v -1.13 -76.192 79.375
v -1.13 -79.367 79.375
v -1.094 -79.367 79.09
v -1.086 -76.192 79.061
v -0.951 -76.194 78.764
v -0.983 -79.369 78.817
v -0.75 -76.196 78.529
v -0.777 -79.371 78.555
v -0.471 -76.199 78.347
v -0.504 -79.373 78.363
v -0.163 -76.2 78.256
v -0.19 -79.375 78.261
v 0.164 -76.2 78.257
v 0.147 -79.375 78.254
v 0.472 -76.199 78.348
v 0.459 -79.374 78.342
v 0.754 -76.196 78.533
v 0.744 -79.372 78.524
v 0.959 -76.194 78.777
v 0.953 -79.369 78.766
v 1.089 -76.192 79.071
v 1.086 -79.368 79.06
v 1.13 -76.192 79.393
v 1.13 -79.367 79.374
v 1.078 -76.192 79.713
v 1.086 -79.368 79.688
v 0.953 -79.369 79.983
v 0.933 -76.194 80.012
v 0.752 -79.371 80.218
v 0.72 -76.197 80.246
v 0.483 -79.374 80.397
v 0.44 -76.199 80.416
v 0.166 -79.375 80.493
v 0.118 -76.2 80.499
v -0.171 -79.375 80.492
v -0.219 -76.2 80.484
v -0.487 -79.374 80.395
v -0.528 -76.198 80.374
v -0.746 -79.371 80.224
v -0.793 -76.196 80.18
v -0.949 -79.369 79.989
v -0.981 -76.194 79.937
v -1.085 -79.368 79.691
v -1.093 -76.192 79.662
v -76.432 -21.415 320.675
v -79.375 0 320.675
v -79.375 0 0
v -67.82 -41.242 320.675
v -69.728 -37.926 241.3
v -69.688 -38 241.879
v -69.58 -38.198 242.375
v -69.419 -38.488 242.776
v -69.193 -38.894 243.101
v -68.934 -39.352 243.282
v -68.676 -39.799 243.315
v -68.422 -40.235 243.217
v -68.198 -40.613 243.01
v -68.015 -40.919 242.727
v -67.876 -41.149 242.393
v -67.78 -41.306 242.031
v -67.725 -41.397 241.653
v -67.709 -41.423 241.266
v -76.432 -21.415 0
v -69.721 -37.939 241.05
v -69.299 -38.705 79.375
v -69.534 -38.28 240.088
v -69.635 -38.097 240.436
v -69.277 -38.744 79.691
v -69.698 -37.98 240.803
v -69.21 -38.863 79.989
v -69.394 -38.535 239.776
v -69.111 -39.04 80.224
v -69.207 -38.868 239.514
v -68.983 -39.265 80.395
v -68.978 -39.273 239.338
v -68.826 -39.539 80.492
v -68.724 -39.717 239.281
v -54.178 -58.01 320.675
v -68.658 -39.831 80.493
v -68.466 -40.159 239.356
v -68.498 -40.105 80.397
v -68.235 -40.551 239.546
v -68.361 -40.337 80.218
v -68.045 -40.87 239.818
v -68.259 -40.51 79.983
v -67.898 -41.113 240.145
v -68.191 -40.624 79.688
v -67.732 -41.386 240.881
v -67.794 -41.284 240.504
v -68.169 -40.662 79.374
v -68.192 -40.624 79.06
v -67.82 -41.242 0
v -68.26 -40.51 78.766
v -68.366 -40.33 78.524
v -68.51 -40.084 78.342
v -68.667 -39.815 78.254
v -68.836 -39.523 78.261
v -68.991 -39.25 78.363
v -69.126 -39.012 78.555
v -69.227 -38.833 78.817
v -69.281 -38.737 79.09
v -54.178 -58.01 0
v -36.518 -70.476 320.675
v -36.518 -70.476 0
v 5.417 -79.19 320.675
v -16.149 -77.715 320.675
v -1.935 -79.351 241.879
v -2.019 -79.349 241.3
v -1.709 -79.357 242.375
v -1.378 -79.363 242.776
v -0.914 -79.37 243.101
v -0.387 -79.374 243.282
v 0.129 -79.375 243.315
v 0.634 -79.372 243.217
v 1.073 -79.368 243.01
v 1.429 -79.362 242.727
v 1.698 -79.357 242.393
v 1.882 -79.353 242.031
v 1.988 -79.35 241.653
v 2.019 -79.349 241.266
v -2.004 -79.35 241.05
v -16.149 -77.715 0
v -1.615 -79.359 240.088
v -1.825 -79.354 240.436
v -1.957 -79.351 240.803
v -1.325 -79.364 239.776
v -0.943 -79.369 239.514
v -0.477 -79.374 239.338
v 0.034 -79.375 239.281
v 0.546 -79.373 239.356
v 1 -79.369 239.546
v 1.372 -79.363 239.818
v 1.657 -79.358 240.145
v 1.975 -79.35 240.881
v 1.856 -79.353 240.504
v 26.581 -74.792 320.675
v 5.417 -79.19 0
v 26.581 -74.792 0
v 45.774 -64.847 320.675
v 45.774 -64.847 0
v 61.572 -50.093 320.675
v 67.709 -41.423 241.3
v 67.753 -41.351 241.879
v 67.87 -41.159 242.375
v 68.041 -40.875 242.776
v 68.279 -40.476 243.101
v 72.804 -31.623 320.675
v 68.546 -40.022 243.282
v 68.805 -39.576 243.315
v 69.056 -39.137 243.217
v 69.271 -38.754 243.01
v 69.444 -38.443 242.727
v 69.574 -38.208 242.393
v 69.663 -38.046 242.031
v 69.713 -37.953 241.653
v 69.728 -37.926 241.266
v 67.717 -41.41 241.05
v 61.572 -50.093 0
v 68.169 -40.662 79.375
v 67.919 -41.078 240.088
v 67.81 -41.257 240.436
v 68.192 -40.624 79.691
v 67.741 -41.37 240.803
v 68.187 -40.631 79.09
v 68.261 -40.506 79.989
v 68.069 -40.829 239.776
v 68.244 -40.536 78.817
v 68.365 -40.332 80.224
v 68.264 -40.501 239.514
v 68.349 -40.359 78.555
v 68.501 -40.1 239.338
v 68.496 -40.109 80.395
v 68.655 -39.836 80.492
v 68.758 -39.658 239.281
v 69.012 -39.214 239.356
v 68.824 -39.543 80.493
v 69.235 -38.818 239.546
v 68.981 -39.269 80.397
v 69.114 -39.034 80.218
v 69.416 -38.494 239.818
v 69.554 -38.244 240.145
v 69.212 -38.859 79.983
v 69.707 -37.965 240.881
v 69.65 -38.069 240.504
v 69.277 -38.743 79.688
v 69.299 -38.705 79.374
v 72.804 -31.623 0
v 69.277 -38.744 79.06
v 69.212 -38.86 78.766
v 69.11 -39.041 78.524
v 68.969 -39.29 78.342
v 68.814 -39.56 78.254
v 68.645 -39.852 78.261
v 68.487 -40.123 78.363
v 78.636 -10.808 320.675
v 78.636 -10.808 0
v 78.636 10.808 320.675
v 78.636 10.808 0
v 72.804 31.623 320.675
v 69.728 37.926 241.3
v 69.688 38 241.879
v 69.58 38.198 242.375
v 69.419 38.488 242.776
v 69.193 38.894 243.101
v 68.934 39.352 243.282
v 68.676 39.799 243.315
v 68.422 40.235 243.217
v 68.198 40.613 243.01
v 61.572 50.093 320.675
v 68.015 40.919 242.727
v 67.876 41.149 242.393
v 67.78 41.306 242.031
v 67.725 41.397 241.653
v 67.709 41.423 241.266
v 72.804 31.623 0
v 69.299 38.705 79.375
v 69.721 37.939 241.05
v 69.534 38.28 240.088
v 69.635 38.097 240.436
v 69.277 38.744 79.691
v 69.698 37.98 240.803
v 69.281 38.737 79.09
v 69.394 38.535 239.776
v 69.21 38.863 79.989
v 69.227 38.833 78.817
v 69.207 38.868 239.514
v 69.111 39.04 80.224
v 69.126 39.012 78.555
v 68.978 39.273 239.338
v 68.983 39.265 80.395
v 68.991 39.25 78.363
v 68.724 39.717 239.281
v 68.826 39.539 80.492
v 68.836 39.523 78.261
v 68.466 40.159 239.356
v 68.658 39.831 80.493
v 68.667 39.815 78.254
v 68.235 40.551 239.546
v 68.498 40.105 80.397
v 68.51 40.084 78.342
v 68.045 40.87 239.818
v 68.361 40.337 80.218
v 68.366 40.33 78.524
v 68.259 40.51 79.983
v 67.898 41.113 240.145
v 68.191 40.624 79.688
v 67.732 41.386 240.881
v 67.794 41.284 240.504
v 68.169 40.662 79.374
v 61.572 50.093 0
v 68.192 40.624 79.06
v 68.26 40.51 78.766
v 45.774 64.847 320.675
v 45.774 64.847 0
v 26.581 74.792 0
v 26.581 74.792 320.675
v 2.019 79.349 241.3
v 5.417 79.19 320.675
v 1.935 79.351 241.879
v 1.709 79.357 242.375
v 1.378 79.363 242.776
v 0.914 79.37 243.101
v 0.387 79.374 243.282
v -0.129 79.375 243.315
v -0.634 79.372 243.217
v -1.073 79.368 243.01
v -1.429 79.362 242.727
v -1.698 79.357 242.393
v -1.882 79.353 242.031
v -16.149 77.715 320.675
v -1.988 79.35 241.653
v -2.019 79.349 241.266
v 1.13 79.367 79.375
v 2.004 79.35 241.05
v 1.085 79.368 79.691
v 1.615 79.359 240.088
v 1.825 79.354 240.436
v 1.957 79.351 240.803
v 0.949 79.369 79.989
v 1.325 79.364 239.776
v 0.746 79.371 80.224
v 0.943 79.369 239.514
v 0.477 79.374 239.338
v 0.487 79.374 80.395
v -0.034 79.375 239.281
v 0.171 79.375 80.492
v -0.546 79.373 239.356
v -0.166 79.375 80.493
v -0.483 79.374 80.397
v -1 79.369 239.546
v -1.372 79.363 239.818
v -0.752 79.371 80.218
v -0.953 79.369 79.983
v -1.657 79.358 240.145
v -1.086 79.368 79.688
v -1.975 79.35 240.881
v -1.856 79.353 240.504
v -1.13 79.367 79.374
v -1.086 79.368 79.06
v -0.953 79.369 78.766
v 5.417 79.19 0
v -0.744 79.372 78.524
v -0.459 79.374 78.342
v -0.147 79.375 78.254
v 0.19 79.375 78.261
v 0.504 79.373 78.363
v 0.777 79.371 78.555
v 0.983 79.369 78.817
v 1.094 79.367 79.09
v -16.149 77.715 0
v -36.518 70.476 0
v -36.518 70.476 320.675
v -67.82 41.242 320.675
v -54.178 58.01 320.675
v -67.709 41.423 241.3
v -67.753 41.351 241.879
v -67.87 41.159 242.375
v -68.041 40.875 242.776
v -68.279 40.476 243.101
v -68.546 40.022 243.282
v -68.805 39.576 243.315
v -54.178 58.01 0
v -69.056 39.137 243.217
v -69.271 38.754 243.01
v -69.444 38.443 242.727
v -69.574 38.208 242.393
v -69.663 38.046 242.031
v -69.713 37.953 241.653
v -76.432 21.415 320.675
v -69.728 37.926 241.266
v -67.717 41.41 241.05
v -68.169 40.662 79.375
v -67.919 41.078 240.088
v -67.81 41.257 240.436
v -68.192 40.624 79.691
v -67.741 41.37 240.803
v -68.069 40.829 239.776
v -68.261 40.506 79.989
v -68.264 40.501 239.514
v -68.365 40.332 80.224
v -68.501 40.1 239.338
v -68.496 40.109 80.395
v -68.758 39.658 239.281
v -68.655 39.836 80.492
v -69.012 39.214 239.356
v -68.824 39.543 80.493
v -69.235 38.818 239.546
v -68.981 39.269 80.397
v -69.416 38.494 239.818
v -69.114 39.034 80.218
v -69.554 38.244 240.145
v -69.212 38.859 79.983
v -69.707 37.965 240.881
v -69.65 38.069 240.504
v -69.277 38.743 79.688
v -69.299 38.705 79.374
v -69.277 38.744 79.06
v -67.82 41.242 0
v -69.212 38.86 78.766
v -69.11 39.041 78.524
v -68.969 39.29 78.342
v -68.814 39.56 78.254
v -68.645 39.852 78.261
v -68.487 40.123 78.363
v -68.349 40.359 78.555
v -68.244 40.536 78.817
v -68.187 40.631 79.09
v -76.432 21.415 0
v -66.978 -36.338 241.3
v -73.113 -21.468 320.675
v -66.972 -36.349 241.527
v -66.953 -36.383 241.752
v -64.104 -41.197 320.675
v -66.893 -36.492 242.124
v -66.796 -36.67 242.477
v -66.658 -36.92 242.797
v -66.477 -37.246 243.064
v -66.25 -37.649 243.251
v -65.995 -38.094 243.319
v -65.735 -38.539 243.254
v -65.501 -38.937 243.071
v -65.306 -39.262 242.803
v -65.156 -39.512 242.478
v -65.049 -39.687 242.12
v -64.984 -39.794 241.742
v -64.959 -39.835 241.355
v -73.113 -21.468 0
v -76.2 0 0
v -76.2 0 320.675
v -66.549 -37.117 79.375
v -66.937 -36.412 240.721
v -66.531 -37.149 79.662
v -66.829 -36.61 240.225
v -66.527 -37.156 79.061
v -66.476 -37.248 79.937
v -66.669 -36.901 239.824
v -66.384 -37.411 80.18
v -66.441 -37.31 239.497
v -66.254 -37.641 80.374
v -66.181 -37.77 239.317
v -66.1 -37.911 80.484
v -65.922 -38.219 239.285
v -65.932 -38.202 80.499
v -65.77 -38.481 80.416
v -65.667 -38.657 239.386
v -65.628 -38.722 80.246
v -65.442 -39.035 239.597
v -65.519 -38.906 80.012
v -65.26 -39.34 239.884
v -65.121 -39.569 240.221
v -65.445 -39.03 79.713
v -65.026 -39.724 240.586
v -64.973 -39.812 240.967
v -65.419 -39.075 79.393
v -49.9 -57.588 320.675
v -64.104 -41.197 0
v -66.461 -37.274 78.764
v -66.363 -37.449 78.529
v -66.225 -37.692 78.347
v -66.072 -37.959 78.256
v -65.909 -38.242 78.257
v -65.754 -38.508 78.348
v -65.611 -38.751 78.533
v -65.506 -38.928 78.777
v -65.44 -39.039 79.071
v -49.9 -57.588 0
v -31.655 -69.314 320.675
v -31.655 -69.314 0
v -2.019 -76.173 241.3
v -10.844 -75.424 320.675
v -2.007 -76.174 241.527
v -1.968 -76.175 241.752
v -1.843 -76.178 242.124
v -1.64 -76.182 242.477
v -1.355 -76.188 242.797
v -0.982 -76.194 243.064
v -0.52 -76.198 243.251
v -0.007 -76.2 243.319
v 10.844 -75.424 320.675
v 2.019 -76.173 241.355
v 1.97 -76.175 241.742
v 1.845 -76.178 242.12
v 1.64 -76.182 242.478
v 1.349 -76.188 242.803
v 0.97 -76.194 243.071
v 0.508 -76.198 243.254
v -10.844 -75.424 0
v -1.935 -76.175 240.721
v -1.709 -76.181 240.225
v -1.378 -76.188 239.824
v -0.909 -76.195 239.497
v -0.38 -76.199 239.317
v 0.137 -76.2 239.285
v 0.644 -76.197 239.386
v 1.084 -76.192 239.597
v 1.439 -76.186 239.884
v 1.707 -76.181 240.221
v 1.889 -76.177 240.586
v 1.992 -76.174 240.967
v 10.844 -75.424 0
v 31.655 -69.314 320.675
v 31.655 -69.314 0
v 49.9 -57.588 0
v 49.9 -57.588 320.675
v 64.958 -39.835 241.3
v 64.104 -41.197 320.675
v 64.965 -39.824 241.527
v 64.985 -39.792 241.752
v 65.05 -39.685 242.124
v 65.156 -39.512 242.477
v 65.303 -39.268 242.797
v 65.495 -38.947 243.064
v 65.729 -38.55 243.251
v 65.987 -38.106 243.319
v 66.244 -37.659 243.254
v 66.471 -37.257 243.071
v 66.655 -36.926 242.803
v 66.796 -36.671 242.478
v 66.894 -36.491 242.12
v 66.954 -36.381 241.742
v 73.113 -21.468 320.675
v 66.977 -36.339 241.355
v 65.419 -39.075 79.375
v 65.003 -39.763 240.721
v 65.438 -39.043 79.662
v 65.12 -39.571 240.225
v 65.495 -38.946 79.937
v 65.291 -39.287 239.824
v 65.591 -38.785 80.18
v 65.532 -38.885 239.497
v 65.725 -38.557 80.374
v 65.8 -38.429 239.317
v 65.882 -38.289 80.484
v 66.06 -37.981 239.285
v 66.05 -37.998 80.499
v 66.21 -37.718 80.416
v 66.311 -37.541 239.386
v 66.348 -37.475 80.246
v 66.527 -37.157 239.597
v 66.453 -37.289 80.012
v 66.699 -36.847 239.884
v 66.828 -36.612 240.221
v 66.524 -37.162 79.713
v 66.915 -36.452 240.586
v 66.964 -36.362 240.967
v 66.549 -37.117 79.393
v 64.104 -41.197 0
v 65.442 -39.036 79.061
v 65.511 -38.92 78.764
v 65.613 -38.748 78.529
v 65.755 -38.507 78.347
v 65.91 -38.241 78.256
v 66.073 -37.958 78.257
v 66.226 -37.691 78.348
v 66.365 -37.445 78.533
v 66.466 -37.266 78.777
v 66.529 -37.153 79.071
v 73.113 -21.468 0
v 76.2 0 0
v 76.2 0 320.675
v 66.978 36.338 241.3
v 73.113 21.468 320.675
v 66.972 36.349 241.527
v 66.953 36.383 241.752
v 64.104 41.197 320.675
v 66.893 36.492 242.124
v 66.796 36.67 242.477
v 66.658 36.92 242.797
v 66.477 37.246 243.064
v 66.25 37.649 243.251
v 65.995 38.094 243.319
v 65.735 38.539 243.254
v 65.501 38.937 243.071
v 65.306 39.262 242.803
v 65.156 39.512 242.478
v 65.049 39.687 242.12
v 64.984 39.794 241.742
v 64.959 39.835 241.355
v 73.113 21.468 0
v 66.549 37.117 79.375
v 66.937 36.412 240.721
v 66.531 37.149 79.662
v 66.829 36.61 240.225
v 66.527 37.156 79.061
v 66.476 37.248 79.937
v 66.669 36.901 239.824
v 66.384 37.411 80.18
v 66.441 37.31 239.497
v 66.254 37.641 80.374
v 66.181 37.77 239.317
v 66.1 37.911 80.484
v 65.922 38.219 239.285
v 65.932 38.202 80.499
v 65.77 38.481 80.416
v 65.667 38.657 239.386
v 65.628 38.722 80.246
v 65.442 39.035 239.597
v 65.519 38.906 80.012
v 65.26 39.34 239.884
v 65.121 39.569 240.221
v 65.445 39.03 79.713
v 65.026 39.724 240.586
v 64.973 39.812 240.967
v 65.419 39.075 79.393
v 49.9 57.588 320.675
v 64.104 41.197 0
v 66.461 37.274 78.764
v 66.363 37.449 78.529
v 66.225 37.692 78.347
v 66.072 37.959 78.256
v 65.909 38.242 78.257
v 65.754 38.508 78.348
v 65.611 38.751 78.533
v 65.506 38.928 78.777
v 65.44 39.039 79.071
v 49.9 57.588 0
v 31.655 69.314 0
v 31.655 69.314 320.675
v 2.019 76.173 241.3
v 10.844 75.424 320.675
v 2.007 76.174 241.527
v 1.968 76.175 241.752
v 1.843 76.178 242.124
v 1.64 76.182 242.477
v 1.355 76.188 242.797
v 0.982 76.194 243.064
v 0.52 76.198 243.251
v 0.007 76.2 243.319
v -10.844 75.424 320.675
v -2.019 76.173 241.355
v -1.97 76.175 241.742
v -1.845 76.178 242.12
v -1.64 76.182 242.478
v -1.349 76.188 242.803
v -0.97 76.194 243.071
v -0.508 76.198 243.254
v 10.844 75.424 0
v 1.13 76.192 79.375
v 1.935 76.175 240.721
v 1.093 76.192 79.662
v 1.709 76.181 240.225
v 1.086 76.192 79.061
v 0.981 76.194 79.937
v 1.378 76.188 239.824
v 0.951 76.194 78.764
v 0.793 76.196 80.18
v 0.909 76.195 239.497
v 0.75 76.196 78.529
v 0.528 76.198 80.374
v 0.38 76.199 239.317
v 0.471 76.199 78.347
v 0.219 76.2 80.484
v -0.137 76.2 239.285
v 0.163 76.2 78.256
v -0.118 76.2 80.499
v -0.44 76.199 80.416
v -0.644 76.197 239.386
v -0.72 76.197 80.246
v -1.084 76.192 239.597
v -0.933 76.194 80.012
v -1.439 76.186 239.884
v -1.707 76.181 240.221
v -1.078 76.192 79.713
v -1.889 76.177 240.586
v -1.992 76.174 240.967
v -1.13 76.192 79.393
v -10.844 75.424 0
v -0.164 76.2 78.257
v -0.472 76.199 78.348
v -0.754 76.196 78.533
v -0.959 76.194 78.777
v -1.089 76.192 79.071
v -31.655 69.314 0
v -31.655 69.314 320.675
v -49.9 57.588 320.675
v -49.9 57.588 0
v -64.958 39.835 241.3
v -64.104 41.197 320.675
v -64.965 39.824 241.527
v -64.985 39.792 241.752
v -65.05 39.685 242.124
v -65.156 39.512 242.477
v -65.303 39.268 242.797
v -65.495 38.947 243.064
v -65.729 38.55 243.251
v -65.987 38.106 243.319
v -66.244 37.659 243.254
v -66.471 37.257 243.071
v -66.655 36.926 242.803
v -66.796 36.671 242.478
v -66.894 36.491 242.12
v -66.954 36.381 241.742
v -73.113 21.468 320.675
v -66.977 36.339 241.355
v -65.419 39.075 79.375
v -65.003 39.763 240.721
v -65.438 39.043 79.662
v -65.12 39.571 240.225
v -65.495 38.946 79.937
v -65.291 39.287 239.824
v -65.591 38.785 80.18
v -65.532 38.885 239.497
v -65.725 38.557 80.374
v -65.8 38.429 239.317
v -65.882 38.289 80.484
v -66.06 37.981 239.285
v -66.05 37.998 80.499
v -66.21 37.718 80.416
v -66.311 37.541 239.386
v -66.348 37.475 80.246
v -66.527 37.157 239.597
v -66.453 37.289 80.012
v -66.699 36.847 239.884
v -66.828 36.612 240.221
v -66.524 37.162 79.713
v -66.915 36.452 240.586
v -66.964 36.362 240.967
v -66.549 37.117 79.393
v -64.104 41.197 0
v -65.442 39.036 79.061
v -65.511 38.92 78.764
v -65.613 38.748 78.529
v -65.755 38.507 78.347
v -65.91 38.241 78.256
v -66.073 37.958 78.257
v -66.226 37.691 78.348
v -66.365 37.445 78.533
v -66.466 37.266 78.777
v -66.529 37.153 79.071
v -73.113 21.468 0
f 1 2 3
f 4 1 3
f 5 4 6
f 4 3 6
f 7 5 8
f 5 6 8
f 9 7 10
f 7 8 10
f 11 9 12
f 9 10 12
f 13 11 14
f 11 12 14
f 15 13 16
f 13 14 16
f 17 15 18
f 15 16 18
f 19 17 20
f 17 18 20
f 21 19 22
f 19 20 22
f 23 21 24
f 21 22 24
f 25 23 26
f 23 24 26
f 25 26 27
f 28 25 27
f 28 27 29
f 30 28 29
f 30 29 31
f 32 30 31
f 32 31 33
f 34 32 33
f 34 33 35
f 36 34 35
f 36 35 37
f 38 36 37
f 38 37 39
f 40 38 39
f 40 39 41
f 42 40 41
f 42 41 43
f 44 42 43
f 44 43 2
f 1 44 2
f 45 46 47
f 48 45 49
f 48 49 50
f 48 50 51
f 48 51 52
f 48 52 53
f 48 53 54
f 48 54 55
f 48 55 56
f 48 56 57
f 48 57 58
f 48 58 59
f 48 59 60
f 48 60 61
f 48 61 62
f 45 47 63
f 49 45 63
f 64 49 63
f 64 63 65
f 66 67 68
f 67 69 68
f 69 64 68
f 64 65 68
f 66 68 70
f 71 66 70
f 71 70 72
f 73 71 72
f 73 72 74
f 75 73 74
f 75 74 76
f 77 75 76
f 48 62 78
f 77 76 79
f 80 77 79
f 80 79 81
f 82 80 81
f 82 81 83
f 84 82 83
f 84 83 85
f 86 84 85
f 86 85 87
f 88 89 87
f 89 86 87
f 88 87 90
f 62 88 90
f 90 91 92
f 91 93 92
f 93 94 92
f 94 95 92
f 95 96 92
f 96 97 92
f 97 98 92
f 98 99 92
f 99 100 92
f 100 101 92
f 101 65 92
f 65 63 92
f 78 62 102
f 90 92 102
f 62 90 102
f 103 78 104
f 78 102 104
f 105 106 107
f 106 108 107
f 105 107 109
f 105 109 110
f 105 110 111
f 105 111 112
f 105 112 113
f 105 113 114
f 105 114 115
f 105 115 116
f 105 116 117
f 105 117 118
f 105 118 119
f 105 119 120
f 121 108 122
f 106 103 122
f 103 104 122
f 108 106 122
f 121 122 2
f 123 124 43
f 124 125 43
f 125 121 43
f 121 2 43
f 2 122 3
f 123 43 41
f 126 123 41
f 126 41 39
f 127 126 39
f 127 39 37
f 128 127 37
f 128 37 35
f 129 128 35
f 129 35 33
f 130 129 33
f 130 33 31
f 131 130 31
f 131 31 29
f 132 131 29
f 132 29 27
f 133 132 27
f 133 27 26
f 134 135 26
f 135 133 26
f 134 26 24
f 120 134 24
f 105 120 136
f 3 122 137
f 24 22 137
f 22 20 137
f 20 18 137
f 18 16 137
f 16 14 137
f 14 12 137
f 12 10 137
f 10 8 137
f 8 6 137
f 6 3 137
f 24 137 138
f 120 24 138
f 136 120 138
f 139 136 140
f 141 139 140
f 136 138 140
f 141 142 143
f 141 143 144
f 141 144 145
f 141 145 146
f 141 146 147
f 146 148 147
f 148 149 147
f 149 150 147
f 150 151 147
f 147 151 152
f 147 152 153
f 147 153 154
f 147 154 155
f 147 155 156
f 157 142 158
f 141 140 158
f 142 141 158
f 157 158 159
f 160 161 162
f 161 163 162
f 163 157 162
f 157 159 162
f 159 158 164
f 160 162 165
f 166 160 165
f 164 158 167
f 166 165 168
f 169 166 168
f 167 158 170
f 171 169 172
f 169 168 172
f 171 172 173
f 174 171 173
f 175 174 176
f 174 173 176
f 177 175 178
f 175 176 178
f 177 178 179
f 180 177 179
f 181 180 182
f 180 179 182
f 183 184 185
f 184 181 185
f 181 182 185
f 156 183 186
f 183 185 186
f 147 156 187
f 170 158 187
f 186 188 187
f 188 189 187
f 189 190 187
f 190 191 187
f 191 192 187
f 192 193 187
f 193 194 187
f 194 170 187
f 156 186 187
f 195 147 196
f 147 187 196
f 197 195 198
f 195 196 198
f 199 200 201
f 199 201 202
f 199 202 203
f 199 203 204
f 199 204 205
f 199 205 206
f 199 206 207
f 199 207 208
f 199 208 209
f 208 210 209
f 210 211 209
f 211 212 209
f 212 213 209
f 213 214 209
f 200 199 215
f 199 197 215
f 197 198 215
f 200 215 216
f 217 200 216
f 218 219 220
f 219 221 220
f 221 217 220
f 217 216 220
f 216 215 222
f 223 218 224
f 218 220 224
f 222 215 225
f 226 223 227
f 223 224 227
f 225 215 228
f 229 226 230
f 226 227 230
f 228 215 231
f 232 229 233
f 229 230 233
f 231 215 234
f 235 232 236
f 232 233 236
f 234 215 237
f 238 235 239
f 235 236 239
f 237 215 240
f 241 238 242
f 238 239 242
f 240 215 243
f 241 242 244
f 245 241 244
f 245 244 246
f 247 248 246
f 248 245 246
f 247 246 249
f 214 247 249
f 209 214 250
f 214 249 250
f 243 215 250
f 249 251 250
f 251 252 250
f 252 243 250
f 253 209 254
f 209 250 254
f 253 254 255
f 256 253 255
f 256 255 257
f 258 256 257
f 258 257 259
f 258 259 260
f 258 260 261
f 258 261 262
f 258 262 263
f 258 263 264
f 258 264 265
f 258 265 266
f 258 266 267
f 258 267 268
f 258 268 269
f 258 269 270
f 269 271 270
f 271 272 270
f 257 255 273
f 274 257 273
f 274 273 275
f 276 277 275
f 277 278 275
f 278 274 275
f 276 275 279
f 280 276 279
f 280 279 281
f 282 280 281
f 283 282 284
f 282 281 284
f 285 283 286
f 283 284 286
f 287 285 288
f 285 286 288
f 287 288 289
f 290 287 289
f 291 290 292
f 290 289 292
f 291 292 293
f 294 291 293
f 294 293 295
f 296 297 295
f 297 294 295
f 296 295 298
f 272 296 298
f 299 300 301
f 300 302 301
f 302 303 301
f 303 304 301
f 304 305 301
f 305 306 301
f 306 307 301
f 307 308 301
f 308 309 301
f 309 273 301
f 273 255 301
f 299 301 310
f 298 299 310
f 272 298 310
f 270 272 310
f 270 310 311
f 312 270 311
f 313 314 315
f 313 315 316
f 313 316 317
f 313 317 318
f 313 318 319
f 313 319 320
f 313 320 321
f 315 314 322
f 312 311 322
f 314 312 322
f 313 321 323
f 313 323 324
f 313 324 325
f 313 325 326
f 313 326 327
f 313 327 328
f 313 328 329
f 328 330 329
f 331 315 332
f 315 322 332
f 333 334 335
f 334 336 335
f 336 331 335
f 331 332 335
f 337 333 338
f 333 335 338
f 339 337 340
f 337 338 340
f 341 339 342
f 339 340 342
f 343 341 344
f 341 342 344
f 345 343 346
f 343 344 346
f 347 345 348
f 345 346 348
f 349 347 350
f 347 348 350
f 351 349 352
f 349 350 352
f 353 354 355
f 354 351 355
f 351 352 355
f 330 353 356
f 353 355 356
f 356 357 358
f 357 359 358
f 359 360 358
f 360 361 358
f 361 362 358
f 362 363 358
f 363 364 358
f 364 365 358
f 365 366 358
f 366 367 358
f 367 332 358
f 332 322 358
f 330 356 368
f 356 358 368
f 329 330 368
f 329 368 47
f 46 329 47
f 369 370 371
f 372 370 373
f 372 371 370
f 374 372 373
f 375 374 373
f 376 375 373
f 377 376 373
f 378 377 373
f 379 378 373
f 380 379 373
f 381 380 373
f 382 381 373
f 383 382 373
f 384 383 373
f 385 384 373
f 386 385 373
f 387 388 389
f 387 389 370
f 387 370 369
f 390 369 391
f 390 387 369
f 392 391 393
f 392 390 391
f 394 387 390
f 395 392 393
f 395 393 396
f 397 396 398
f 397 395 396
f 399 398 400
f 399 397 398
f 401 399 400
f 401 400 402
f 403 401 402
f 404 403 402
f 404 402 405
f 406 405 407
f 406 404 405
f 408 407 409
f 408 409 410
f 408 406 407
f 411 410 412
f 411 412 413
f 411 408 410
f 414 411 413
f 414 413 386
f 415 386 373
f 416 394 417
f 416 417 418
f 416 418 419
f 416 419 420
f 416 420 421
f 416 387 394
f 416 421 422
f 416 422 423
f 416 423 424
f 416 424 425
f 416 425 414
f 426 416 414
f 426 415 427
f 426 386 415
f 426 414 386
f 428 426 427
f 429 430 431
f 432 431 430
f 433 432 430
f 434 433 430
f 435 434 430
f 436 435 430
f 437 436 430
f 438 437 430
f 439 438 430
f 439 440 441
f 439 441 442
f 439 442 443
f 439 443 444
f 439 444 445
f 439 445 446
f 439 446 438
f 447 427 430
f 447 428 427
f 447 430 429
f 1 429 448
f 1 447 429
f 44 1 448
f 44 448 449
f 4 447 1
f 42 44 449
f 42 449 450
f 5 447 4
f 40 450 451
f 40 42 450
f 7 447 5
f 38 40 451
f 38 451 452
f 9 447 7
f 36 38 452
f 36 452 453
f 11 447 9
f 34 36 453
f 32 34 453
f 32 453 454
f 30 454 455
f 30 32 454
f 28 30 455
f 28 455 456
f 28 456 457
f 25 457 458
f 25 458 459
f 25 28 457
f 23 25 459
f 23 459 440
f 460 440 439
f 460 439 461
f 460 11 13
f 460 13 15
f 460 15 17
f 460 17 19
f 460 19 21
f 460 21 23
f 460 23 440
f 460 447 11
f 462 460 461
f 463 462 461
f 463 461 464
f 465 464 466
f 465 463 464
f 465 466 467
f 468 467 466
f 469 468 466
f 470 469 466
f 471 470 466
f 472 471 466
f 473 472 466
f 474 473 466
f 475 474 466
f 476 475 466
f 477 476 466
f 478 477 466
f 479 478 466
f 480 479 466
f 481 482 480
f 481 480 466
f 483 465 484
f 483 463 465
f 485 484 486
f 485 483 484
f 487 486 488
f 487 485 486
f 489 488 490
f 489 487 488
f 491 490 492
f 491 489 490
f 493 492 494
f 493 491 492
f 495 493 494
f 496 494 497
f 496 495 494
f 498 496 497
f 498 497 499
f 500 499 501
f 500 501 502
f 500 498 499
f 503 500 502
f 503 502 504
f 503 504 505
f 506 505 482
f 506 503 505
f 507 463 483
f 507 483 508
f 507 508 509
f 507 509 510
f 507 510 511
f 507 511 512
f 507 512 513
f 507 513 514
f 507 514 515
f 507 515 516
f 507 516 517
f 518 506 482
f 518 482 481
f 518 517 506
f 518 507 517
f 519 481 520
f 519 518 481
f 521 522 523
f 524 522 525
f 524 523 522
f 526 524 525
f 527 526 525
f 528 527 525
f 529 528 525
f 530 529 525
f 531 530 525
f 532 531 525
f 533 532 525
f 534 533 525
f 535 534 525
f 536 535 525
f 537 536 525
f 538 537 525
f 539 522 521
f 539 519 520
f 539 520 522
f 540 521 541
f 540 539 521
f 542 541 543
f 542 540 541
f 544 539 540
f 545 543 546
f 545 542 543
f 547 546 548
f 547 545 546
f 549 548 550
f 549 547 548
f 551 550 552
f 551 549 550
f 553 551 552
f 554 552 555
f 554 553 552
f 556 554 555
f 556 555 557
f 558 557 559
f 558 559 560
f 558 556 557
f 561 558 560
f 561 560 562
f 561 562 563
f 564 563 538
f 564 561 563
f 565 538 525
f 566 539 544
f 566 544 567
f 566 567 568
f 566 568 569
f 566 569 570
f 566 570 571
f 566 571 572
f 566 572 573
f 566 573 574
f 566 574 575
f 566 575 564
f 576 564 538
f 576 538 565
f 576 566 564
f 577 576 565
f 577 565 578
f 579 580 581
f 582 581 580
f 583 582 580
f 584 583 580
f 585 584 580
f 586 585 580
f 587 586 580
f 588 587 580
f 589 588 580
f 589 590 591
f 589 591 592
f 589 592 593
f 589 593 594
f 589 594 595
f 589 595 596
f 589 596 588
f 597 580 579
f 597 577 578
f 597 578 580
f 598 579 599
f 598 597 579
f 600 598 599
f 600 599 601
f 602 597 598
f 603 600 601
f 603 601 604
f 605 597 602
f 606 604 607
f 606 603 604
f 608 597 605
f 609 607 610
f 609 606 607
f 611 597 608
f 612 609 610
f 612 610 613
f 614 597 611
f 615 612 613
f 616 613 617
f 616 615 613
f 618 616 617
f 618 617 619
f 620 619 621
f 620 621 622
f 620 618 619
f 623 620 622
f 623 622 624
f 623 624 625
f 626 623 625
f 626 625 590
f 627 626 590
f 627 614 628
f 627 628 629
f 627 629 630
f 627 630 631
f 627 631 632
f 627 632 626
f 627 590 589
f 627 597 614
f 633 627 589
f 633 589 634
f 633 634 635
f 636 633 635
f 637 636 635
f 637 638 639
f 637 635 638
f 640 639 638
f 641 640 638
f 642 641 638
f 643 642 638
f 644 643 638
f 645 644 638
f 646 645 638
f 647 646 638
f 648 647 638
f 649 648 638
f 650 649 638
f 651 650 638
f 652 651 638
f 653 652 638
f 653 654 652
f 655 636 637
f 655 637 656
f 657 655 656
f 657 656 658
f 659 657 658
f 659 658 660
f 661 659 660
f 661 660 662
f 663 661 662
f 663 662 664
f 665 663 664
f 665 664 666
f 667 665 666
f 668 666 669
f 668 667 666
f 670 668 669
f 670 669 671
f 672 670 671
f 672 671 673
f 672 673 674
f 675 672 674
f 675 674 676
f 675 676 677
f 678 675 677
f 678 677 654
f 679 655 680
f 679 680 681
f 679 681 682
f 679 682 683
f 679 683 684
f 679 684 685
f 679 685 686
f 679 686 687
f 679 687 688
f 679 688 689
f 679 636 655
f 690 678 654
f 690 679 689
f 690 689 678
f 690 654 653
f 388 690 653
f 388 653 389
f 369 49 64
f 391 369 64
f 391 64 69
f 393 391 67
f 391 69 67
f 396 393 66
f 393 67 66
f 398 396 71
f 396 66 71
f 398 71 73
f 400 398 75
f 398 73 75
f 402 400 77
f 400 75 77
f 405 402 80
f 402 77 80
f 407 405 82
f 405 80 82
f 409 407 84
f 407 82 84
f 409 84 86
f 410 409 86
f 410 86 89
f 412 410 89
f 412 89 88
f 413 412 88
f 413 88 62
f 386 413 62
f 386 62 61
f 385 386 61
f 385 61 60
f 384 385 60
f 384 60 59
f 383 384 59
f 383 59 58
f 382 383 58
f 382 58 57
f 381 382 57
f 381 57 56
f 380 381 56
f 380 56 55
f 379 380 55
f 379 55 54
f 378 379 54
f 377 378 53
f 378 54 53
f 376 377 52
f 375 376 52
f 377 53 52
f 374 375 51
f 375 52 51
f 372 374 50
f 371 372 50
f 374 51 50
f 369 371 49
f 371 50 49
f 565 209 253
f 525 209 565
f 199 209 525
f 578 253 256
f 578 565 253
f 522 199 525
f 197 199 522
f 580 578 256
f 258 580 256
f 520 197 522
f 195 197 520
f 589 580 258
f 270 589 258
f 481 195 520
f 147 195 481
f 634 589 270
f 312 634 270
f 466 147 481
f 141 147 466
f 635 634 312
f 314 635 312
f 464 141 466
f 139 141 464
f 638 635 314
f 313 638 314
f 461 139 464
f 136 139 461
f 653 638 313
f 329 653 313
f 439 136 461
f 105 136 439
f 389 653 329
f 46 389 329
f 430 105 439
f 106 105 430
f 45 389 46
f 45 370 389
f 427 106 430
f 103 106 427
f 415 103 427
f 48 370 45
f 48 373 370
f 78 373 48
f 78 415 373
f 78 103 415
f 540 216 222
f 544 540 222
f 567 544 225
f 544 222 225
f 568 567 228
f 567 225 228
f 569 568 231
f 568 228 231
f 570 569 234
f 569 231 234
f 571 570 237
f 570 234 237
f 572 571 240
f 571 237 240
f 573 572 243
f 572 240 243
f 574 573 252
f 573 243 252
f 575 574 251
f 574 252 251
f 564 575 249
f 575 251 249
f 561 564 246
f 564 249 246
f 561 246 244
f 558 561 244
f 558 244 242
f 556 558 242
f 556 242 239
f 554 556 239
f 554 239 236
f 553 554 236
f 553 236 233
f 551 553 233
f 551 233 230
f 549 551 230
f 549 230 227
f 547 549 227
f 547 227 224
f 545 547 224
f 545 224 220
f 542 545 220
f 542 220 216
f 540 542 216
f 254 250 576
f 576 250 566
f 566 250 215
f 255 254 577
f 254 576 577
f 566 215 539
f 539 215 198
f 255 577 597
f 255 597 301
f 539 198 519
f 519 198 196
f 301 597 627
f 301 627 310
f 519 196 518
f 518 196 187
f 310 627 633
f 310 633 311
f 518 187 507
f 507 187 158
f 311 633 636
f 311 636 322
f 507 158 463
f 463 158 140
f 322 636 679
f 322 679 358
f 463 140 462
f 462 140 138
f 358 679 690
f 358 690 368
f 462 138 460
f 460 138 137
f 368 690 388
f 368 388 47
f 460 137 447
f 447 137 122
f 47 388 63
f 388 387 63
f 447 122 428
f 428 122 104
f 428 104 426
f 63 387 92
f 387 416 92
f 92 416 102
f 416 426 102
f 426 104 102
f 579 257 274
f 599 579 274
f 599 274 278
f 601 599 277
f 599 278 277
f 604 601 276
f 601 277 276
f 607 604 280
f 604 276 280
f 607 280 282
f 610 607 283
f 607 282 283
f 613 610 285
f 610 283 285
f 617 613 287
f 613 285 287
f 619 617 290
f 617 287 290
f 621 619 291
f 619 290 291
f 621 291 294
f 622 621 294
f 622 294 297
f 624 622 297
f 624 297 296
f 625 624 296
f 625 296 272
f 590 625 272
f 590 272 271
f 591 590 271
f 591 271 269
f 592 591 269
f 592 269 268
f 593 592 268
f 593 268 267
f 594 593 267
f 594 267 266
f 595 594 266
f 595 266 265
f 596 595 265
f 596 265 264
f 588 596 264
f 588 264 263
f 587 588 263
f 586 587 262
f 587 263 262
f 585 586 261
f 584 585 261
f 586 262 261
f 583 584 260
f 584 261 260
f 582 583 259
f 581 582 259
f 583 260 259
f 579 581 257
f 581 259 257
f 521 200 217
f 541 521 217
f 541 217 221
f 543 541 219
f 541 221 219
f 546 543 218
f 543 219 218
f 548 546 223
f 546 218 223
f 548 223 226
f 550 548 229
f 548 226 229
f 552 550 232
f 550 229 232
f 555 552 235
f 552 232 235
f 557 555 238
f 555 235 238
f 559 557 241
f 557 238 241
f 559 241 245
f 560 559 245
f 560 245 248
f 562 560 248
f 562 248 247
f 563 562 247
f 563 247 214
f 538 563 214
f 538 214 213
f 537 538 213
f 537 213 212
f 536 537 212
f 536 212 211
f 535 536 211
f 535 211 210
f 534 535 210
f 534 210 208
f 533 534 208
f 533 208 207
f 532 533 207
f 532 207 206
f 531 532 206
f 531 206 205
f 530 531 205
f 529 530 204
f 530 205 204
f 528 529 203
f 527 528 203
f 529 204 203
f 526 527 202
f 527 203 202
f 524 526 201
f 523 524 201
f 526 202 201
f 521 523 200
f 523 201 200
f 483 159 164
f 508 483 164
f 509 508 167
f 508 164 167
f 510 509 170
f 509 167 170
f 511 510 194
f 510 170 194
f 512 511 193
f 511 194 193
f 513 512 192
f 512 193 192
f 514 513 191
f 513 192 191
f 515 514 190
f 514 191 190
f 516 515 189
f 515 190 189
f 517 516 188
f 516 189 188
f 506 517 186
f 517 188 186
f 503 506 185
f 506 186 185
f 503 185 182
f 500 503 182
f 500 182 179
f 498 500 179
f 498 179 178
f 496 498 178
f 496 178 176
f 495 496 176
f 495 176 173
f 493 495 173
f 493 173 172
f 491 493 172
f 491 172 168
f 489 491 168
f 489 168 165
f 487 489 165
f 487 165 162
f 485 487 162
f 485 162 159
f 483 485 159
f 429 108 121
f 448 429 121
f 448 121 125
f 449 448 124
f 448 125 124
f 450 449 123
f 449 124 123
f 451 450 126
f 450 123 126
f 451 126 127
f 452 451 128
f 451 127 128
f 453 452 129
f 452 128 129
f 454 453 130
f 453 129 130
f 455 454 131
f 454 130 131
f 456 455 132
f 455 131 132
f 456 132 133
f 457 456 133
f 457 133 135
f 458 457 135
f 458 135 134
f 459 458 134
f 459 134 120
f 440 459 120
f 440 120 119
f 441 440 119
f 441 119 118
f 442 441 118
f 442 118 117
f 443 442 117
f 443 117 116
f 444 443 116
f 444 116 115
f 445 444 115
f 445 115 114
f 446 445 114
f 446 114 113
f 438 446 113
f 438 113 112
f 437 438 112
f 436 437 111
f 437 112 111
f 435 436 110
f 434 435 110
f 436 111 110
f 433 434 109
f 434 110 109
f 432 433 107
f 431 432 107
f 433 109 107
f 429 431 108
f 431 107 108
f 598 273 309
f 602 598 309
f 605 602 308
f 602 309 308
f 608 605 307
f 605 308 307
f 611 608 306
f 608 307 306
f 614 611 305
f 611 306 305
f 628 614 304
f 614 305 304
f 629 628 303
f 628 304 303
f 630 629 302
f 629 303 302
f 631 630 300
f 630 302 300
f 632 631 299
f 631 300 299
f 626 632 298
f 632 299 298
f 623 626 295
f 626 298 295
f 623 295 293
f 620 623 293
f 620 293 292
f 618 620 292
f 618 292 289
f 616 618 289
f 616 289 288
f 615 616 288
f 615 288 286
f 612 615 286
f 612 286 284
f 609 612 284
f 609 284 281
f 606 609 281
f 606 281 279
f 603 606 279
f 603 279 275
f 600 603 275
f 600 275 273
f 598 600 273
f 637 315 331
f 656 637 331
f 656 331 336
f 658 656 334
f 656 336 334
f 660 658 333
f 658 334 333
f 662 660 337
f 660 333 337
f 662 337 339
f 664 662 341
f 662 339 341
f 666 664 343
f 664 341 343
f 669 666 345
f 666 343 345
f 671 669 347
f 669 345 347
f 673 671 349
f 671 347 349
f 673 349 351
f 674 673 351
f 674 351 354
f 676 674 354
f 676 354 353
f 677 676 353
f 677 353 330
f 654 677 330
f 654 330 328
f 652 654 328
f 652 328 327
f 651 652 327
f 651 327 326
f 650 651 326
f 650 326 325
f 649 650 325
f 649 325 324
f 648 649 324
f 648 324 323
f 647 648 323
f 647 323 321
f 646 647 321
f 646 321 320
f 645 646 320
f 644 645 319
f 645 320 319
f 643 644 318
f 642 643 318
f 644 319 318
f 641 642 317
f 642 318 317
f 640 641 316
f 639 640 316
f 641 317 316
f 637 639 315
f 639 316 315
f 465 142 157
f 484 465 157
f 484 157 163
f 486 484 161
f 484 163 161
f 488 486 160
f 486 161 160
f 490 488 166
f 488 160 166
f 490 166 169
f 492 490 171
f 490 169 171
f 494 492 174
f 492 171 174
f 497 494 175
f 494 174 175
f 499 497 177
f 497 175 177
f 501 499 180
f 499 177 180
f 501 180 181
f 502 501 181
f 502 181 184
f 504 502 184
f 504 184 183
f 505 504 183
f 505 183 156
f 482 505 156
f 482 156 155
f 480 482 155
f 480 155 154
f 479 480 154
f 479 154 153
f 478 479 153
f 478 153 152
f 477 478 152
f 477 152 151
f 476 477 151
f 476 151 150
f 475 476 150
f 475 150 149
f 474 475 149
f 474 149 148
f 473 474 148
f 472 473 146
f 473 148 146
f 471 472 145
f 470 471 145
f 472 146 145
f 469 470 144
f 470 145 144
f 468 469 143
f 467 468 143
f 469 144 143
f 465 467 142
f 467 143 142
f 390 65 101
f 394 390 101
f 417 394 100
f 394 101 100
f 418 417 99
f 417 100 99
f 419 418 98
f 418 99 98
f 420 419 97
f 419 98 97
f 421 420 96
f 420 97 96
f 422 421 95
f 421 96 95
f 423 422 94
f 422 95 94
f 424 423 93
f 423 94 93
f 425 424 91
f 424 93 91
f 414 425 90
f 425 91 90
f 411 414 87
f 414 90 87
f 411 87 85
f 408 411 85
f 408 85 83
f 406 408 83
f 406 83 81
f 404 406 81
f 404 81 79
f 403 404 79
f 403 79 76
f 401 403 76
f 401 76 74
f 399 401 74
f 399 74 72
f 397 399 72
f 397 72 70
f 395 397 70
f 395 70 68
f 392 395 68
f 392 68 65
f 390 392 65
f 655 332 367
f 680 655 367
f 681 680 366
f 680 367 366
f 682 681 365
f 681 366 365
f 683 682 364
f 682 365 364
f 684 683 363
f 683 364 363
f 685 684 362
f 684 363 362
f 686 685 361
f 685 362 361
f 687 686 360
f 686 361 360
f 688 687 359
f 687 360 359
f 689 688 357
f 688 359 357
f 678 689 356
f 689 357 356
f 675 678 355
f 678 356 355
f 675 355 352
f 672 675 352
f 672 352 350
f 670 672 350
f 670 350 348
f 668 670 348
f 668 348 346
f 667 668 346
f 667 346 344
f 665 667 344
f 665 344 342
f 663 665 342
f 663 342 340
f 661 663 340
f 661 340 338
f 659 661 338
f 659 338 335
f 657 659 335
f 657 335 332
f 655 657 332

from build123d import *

# Parameters (mm, degrees)
SKETCH1_R                   = 79.375
SKETCH1_R_2                 = 76.2
BOSS_EXTRUDE1_DEPTH         = 320.675
F_4_40_TAPPED_HOLE1_REACH   = 368.517
F_4_40_TAPPED_HOLE1_BORE_R  = 1.1303
F_10_32_TAPPED_HOLE1_REACH  = 368.517
F_10_32_TAPPED_HOLE1_BORE_R = 2.0193
CIRPATTERN1_COUNT           = 6


with BuildPart() as part:
    # Sketch1 → Boss-Extrude1 (new body)
    with BuildSketch(Plane.XY):
        with Locations(Location((0, 0, 0), (0, 0, 180))):
            Circle(SKETCH1_R)
        with Locations(Location((0, 0, 0), (0, 0, 180))):
            Circle(SKETCH1_R_2, mode=Mode.SUBTRACT)
    extrude(amount=BOSS_EXTRUDE1_DEPTH)

    # #4-40 Tapped Hole1 bore → #4-40 Tapped Hole1 (cut, up to next)
    with BuildSketch(Plane(origin=(0, 79.375, 0), x_dir=(1, 0, 0), z_dir=(0, 1, 0)), mode=Mode.PRIVATE) as f_4_40_tapped_hole1_sk1:
        with Locations((0, -79.375)):
            Circle(F_4_40_TAPPED_HOLE1_BORE_R)
    f_4_40_tapped_hole1_tool1 = extrude(f_4_40_tapped_hole1_sk1.sketch, amount=-F_4_40_TAPPED_HOLE1_REACH, mode=Mode.PRIVATE) & part.part
    f_4_40_tapped_hole1 = f_4_40_tapped_hole1_tool1.solids().sort_by_distance((0, 79.375, 79.375))[0]
    add(f_4_40_tapped_hole1, mode=Mode.SUBTRACT)

    # #10-32 Tapped Hole1 bore → #10-32 Tapped Hole1 (cut, up to next)
    with BuildSketch(Plane(origin=(0, 79.375, 0), x_dir=(1, 0, 0), z_dir=(0, 1, 0)), mode=Mode.PRIVATE) as f_10_32_tapped_hole1_sk1:
        with Locations((0, -241.3)):
            Circle(F_10_32_TAPPED_HOLE1_BORE_R)
    f_10_32_tapped_hole1_tool1 = extrude(f_10_32_tapped_hole1_sk1.sketch, amount=-F_10_32_TAPPED_HOLE1_REACH, mode=Mode.PRIVATE) & part.part
    f_10_32_tapped_hole1 = f_10_32_tapped_hole1_tool1.solids().sort_by_distance((0, 79.375, 241.3))[0]
    add(f_10_32_tapped_hole1, mode=Mode.SUBTRACT)

    # CirPattern1: #4-40 Tapped Hole1, #10-32 Tapped Hole1 ×6 about axis
    cirpattern1_axis = Axis((0, 0, 320.675), (0, 0, 1))
    add([f_4_40_tapped_hole1.rotate(cirpattern1_axis, i * 360 / CIRPATTERN1_COUNT) for i in range(1, CIRPATTERN1_COUNT)], mode=Mode.SUBTRACT)
    add([f_10_32_tapped_hole1.rotate(cirpattern1_axis, i * 360 / CIRPATTERN1_COUNT) for i in range(1, CIRPATTERN1_COUNT)], mode=Mode.SUBTRACT)


solid = part.part
